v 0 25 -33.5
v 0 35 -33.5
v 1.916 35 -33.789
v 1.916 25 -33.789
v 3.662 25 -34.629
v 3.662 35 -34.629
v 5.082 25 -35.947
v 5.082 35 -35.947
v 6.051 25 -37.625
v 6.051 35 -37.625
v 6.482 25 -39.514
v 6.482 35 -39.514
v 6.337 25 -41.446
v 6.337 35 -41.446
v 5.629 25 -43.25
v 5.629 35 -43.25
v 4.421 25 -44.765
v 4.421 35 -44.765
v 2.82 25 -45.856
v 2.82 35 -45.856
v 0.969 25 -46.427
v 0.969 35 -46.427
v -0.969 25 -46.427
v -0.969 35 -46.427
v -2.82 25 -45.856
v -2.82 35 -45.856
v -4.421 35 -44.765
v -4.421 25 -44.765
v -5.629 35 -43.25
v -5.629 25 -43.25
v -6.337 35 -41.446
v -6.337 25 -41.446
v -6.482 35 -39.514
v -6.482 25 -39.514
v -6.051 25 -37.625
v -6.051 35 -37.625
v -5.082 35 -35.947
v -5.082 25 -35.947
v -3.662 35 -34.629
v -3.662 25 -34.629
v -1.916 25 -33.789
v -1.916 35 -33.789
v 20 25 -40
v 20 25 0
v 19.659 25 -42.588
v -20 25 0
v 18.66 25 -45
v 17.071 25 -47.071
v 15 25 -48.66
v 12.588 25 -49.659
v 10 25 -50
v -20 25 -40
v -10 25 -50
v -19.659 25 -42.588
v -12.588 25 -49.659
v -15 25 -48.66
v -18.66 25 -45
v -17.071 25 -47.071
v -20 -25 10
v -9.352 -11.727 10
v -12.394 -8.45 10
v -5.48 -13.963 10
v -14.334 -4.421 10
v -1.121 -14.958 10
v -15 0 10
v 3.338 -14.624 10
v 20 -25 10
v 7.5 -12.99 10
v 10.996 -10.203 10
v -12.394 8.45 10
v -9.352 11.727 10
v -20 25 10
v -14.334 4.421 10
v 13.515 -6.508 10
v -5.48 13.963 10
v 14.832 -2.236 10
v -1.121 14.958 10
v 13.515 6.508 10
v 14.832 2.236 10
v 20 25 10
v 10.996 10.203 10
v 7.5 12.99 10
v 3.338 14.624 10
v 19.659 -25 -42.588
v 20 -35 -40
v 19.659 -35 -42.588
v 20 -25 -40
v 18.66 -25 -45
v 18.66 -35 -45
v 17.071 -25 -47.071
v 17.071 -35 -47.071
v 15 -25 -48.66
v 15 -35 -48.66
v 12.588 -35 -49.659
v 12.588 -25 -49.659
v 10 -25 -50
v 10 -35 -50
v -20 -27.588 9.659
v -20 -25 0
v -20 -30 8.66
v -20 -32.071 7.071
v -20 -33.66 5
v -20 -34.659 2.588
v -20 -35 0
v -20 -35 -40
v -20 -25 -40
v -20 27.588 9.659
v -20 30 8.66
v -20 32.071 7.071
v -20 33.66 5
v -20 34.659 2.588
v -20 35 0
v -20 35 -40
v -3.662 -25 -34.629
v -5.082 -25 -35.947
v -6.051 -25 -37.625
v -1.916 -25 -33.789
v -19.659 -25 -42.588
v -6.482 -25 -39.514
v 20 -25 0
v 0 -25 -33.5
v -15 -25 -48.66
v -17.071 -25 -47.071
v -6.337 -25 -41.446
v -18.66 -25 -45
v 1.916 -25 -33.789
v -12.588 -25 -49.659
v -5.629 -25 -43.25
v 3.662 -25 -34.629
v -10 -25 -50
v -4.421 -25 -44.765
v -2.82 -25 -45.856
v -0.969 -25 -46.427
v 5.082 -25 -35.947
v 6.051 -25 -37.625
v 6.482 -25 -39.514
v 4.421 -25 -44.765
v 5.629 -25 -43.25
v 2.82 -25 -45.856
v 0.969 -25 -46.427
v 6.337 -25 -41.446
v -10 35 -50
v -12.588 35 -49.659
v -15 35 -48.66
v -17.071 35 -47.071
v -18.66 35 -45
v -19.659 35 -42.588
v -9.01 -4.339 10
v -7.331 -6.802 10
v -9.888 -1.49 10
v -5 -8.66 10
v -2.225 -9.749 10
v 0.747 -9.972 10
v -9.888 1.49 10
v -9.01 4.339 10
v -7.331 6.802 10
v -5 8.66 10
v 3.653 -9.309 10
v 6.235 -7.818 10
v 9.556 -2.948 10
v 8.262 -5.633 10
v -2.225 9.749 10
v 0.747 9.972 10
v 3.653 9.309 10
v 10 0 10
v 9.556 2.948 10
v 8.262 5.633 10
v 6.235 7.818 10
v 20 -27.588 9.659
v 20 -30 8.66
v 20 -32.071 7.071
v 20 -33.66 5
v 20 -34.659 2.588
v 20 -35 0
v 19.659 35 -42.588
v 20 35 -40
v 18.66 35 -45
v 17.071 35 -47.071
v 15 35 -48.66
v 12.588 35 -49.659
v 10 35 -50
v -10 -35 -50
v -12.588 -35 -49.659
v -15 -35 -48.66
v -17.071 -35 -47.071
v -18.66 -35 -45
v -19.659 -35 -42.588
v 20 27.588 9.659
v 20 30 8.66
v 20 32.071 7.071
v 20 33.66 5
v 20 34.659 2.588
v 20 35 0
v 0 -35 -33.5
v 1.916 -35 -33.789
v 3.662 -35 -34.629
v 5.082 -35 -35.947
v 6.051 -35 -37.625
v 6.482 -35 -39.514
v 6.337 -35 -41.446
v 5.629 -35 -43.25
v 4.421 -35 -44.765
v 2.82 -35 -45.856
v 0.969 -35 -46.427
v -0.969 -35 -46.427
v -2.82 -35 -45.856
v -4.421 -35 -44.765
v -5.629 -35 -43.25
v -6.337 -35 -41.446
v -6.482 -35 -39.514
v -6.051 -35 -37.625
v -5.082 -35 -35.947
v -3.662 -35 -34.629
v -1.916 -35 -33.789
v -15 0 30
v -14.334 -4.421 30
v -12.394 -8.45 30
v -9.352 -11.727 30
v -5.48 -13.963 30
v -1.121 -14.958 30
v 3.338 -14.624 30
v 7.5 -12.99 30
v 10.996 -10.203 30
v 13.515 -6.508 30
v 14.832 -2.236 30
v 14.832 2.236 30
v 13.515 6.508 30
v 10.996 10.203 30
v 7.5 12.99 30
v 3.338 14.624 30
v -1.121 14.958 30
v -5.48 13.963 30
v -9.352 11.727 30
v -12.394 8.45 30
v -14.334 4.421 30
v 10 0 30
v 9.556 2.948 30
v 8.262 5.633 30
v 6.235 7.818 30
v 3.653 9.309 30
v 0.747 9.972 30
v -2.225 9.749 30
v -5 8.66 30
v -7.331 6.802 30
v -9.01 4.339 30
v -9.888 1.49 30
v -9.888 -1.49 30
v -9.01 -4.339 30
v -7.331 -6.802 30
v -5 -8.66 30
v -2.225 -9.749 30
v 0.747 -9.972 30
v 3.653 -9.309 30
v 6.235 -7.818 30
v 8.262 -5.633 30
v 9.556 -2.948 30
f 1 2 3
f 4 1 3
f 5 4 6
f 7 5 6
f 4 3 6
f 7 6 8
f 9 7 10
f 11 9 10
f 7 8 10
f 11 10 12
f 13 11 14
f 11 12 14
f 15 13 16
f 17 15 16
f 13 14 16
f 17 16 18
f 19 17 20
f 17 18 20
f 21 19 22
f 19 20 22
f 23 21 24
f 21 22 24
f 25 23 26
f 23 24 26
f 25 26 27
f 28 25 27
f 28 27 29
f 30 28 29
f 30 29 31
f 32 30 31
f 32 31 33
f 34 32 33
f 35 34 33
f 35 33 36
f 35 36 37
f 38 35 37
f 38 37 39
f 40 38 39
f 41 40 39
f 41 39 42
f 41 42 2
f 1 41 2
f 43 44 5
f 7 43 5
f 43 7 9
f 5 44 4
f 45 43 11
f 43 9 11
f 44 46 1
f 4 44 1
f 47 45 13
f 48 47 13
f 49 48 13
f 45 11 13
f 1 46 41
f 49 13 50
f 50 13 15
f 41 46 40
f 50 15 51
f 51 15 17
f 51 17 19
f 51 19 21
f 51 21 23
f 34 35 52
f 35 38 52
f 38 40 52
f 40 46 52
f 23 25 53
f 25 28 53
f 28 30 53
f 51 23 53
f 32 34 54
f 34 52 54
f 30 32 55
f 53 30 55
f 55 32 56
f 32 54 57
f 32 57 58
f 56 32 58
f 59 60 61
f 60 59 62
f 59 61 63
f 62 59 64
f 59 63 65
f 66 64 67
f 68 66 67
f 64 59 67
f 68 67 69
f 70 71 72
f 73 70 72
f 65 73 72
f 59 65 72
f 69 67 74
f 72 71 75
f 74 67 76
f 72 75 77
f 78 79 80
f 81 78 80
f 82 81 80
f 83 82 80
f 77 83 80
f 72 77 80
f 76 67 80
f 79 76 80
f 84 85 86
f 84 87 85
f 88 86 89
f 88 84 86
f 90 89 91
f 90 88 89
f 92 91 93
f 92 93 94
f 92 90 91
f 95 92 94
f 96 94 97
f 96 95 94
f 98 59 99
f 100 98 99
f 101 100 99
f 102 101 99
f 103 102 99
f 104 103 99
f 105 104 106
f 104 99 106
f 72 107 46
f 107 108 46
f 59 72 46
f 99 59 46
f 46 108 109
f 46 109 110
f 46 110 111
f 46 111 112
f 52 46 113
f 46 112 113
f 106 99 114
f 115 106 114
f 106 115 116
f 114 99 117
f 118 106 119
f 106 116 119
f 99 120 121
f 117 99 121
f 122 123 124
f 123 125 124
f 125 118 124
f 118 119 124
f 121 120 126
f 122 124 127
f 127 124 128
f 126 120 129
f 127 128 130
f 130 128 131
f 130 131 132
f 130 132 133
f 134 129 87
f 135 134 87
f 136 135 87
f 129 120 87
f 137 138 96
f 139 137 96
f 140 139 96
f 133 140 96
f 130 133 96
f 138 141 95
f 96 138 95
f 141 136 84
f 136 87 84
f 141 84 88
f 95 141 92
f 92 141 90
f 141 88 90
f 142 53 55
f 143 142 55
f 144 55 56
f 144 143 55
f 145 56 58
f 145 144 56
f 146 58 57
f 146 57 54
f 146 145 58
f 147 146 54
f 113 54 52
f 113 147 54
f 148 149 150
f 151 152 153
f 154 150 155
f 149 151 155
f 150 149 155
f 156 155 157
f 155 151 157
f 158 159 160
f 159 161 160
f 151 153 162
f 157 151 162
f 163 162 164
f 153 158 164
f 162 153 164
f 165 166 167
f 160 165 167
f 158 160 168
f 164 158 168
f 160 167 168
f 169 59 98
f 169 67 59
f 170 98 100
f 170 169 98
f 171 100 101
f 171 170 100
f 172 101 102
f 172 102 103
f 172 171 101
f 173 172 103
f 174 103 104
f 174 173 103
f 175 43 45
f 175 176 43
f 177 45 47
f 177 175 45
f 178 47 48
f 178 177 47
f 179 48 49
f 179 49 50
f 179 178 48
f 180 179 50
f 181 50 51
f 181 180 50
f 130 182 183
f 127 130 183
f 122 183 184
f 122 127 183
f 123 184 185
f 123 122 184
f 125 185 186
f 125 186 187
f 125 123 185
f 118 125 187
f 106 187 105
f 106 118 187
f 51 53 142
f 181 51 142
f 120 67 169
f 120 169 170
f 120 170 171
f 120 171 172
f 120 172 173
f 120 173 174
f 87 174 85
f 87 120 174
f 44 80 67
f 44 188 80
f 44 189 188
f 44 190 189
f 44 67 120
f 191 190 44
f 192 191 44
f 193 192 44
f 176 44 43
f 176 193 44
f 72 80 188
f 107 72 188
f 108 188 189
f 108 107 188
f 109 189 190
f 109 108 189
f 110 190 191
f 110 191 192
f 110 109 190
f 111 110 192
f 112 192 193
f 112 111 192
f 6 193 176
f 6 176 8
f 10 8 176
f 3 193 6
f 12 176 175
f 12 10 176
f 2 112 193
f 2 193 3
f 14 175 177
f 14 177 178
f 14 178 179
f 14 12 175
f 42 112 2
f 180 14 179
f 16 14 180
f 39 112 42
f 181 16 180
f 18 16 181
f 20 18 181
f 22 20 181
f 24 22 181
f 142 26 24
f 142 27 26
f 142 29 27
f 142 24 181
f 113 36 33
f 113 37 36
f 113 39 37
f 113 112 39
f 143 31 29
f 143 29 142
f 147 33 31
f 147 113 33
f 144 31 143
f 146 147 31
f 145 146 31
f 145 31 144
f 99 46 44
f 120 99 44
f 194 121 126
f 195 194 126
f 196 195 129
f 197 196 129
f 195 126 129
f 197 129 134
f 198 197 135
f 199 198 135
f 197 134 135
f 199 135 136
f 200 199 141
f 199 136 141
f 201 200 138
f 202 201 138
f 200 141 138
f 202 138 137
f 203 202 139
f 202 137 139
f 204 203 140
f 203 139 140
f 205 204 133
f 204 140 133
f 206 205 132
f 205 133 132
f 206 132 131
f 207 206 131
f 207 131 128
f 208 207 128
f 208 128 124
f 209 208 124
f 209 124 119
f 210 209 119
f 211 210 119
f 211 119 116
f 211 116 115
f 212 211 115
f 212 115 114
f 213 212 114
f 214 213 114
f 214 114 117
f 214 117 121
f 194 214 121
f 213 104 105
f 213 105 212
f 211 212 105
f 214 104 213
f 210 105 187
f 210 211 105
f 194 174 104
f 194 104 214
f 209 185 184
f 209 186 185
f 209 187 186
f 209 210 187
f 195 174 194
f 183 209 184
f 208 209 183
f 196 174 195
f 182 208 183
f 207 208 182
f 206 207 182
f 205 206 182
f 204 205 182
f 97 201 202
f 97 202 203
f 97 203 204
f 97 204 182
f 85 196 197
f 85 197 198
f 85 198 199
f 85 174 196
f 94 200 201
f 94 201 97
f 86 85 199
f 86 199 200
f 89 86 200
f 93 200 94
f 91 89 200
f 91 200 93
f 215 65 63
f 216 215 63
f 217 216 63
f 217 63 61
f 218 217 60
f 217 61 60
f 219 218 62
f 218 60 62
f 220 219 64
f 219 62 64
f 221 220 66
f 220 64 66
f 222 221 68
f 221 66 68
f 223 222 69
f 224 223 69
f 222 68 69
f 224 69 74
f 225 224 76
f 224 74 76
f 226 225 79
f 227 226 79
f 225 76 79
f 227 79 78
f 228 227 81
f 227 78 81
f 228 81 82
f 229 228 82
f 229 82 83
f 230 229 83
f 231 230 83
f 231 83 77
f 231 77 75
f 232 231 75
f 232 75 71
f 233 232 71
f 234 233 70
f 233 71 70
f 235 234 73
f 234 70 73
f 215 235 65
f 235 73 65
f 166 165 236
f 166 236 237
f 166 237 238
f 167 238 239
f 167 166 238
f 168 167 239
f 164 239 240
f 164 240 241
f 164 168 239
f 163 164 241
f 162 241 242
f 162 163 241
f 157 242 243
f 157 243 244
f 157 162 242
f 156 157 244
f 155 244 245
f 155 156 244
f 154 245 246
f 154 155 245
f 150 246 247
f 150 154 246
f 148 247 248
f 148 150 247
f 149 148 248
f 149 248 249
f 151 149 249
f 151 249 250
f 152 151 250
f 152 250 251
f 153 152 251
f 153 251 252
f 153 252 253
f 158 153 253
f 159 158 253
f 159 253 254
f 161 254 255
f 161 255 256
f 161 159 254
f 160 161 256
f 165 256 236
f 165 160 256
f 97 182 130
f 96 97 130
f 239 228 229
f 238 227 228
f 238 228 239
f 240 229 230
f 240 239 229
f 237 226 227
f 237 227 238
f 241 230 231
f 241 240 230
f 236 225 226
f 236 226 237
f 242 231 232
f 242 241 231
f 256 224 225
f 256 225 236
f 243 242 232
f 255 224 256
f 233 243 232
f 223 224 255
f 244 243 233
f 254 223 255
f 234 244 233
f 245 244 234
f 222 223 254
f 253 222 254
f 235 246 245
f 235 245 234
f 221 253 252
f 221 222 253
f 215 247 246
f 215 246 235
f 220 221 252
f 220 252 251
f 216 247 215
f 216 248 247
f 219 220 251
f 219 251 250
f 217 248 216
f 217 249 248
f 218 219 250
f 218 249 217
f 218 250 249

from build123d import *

# Parameters (mm, degrees)
SKETCH1_W           = 40
SKETCH1_H           = 50
BOSS_EXTRUDE1_DEPTH = 10
SKETCH2_W           = 60
SKETCH2_H           = 10
BOSS_EXTRUDE2_DEPTH = 20
FILLET1_R           = 10
SKETCH3_R           = 15
SKETCH3_R_2         = 10
BOSS_EXTRUDE3_DEPTH = 20
SKETCH4_R           = 6.5
CUT_EXTRUDE1_DEPTH  = 89.317608663


with BuildPart() as part:
    # Sketch1 → Boss-Extrude1 (new body)
    with BuildSketch(Plane.XY):
        Rectangle(SKETCH1_W, SKETCH1_H)
    extrude(amount=BOSS_EXTRUDE1_DEPTH)

    # Sketch2 → Boss-Extrude2 (add, symmetric)
    with BuildSketch(Plane(origin=(0, 0, 0), x_dir=(0, 0, -1), z_dir=(1, 0, 0))):
        with Locations((20, 30)):
            Rectangle(SKETCH2_W, SKETCH2_H)
        with Locations((20, -30)):
            Rectangle(SKETCH2_W, SKETCH2_H)
    extrude(amount=BOSS_EXTRUDE2_DEPTH, both=True)

    # Fillet1
    fillet1_edges = [part.edges().sort_by_distance(p)[0] for p in [
        (0, 35, 10),
        (-20, 30, -50),
        (20, 30, -50),
        (0, -35, 10),
        (-20, -30, -50),
        (20, -30, -50),
    ]]
    fillet(fillet1_edges, radius=FILLET1_R)

    # Sketch3 → Boss-Extrude3 (add)
    with BuildSketch(Plane.XY.offset(10)):
        with Locations(Location((0, 0, 0), (0, 0, 180))):
            Circle(SKETCH3_R)
        Circle(SKETCH3_R_2, mode=Mode.SUBTRACT)
    extrude(amount=BOSS_EXTRUDE3_DEPTH)

    # Sketch4 → Cut-Extrude1 (cut, through all)
    with BuildSketch(Plane(origin=(0, 35, 0), x_dir=(1, 0, 0), z_dir=(0, 1, 0))):
        with Locations(Location((0, 40, 0), (0, 0, 270))):
            Circle(SKETCH4_R)
    extrude(amount=-CUT_EXTRUDE1_DEPTH, mode=Mode.SUBTRACT)


solid = part.part
